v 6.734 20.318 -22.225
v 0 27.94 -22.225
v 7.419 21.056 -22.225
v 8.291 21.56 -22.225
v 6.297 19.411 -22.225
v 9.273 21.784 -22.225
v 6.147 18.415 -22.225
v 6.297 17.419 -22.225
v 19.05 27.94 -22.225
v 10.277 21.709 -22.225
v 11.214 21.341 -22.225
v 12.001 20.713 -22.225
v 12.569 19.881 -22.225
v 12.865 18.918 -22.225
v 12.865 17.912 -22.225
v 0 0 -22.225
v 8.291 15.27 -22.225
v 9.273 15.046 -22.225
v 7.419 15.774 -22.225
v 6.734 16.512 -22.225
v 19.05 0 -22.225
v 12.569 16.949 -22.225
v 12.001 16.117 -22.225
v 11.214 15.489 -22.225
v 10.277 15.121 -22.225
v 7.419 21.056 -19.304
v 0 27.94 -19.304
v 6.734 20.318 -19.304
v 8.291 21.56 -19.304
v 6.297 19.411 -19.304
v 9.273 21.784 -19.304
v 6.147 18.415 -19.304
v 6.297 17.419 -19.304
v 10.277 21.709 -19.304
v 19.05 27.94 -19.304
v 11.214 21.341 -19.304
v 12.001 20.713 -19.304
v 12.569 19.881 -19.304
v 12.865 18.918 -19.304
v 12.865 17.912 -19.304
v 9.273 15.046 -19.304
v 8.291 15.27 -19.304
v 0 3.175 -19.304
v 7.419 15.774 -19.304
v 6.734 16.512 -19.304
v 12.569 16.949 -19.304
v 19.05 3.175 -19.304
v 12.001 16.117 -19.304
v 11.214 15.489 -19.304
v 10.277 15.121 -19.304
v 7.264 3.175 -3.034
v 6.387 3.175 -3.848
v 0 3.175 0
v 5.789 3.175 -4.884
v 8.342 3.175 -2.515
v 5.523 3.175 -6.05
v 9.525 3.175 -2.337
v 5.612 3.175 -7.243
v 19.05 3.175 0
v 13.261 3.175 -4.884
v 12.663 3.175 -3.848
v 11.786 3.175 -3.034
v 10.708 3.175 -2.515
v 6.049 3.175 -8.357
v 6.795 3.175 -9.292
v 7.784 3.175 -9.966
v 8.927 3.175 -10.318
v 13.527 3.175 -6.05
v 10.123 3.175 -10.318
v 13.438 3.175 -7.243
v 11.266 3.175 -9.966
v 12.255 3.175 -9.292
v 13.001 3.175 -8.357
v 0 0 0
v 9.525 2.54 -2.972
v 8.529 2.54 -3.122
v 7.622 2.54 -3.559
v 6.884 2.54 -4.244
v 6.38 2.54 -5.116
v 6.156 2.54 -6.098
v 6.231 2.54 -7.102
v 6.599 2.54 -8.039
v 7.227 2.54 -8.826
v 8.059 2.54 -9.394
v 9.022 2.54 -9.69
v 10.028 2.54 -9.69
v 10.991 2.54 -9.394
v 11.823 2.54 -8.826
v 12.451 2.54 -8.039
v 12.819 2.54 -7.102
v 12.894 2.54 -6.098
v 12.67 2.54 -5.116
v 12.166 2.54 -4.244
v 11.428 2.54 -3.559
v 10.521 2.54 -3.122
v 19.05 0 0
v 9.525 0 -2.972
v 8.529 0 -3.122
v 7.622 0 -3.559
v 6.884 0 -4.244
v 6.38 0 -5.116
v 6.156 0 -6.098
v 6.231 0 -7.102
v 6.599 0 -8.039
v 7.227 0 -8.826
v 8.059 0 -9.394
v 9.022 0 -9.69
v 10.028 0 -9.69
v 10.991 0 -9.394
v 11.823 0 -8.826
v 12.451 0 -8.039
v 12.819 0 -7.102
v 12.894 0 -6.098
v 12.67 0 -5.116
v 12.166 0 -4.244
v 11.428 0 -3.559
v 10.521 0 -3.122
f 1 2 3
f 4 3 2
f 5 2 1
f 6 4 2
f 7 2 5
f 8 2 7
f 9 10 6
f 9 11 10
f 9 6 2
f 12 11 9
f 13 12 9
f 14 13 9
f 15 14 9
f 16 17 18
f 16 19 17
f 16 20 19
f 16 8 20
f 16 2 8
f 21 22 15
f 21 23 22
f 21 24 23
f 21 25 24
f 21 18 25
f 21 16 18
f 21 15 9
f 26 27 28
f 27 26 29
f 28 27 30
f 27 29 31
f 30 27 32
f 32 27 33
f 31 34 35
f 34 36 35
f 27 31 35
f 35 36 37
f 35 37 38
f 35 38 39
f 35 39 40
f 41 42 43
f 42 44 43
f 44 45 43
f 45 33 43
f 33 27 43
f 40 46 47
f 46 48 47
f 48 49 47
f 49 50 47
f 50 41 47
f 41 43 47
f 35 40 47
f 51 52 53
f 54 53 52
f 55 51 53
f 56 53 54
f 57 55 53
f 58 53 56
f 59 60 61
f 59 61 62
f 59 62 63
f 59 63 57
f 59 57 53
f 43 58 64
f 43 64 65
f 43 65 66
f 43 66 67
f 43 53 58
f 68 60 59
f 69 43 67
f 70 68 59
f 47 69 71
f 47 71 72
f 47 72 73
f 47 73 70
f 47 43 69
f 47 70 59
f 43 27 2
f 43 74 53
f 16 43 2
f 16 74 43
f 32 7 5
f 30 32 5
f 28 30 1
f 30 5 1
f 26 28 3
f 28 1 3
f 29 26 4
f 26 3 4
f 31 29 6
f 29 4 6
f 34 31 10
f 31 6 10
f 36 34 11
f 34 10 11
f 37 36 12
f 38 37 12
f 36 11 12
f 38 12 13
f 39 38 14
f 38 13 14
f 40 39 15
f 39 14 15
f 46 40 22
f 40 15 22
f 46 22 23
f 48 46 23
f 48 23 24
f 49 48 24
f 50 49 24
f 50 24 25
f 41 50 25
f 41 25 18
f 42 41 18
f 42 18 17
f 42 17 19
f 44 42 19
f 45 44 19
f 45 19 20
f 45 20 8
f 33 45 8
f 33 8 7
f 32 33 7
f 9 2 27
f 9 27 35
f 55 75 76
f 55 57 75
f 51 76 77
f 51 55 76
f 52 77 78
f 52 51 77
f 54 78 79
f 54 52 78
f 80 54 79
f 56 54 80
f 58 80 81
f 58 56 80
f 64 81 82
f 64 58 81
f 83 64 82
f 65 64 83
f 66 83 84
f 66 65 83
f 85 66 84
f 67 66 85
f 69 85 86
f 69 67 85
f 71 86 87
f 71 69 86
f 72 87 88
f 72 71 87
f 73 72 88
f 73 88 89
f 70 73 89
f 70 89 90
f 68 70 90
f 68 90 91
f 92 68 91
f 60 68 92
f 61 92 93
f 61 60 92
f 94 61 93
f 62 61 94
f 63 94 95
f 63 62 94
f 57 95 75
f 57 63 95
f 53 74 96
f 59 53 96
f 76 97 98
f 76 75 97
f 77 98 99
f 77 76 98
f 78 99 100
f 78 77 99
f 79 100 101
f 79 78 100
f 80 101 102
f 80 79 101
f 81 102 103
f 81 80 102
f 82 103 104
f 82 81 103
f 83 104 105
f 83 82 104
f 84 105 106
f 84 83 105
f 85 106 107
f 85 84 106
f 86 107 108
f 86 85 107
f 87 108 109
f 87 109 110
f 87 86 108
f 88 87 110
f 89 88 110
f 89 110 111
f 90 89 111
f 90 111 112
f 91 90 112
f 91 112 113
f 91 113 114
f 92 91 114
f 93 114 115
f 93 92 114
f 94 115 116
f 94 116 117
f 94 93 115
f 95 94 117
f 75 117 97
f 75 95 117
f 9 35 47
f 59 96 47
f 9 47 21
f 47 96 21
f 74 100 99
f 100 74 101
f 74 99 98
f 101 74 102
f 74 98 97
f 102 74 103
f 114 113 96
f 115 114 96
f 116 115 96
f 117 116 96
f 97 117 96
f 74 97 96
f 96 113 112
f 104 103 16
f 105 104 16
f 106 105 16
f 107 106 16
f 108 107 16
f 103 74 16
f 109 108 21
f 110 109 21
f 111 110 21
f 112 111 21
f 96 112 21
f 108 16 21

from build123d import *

# Parameters (mm, degrees)
SKETCH1_W               = 19.05
SKETCH1_H               = 22.225
BOSS_EXTRUDE1_DEPTH     = 3.175
SKETCH2_W               = 19.05
SKETCH2_H               = 3.175
BOSS_EXTRUDE2_DEPTH     = 24.765
F_1_4_CLEARANCE_HOLE3_D = 6.7564
MOVE_FACE1_BY           = 0.254


with BuildPart() as part:
    # Sketch1 → Boss-Extrude1 (new body)
    with BuildSketch(Plane(origin=(0, 0, 0), x_dir=(1, 0, 0), z_dir=(0, 1, 0))):
        with Locations((9.525, 11.1125)):
            Rectangle(SKETCH1_W, SKETCH1_H)
    extrude(amount=BOSS_EXTRUDE1_DEPTH)

    # Sketch2 → Boss-Extrude2 (add)
    with BuildSketch(Plane(origin=(0, 3.175, 0), x_dir=(1, 0, 0), z_dir=(0, 1, 0))):
        with Locations((9.525, 20.6375)):
            Rectangle(SKETCH2_W, SKETCH2_H)
    extrude(amount=BOSS_EXTRUDE2_DEPTH)

    # Sketch7 → 1/4 Clearance Hole2 (revolve, cut)
    with BuildSketch(Plane(origin=(9.525, 3.175, -6.35), x_dir=(0, 0, 1), z_dir=(1, 0, 0))):
        Polygon((0, 0), (0, 3.175), (3.3782, 3.175), (3.3782, 0.635), (4.0132, 0), align=None)
    revolve(axis=Axis((9.525, 9.525, -6.35), (0, -1, 0)), mode=Mode.SUBTRACT)

    # 1/4 Clearance Hole3 (through all)
    with Locations(Plane(origin=(9.525, 18.415, -19.05), x_dir=(1, 0, 0), z_dir=(0, 0, 1))):
        with Locations((0, 0)):
            Hole(F_1_4_CLEARANCE_HOLE3_D / 2)

    # Move Face1: a face moved inward by 0.254
    extrude(part.faces().sort_by_distance((9.525, 9.36625, -19.05))[0], amount=MOVE_FACE1_BY, dir=(0, 0, -1), mode=Mode.SUBTRACT)


solid = part.part
